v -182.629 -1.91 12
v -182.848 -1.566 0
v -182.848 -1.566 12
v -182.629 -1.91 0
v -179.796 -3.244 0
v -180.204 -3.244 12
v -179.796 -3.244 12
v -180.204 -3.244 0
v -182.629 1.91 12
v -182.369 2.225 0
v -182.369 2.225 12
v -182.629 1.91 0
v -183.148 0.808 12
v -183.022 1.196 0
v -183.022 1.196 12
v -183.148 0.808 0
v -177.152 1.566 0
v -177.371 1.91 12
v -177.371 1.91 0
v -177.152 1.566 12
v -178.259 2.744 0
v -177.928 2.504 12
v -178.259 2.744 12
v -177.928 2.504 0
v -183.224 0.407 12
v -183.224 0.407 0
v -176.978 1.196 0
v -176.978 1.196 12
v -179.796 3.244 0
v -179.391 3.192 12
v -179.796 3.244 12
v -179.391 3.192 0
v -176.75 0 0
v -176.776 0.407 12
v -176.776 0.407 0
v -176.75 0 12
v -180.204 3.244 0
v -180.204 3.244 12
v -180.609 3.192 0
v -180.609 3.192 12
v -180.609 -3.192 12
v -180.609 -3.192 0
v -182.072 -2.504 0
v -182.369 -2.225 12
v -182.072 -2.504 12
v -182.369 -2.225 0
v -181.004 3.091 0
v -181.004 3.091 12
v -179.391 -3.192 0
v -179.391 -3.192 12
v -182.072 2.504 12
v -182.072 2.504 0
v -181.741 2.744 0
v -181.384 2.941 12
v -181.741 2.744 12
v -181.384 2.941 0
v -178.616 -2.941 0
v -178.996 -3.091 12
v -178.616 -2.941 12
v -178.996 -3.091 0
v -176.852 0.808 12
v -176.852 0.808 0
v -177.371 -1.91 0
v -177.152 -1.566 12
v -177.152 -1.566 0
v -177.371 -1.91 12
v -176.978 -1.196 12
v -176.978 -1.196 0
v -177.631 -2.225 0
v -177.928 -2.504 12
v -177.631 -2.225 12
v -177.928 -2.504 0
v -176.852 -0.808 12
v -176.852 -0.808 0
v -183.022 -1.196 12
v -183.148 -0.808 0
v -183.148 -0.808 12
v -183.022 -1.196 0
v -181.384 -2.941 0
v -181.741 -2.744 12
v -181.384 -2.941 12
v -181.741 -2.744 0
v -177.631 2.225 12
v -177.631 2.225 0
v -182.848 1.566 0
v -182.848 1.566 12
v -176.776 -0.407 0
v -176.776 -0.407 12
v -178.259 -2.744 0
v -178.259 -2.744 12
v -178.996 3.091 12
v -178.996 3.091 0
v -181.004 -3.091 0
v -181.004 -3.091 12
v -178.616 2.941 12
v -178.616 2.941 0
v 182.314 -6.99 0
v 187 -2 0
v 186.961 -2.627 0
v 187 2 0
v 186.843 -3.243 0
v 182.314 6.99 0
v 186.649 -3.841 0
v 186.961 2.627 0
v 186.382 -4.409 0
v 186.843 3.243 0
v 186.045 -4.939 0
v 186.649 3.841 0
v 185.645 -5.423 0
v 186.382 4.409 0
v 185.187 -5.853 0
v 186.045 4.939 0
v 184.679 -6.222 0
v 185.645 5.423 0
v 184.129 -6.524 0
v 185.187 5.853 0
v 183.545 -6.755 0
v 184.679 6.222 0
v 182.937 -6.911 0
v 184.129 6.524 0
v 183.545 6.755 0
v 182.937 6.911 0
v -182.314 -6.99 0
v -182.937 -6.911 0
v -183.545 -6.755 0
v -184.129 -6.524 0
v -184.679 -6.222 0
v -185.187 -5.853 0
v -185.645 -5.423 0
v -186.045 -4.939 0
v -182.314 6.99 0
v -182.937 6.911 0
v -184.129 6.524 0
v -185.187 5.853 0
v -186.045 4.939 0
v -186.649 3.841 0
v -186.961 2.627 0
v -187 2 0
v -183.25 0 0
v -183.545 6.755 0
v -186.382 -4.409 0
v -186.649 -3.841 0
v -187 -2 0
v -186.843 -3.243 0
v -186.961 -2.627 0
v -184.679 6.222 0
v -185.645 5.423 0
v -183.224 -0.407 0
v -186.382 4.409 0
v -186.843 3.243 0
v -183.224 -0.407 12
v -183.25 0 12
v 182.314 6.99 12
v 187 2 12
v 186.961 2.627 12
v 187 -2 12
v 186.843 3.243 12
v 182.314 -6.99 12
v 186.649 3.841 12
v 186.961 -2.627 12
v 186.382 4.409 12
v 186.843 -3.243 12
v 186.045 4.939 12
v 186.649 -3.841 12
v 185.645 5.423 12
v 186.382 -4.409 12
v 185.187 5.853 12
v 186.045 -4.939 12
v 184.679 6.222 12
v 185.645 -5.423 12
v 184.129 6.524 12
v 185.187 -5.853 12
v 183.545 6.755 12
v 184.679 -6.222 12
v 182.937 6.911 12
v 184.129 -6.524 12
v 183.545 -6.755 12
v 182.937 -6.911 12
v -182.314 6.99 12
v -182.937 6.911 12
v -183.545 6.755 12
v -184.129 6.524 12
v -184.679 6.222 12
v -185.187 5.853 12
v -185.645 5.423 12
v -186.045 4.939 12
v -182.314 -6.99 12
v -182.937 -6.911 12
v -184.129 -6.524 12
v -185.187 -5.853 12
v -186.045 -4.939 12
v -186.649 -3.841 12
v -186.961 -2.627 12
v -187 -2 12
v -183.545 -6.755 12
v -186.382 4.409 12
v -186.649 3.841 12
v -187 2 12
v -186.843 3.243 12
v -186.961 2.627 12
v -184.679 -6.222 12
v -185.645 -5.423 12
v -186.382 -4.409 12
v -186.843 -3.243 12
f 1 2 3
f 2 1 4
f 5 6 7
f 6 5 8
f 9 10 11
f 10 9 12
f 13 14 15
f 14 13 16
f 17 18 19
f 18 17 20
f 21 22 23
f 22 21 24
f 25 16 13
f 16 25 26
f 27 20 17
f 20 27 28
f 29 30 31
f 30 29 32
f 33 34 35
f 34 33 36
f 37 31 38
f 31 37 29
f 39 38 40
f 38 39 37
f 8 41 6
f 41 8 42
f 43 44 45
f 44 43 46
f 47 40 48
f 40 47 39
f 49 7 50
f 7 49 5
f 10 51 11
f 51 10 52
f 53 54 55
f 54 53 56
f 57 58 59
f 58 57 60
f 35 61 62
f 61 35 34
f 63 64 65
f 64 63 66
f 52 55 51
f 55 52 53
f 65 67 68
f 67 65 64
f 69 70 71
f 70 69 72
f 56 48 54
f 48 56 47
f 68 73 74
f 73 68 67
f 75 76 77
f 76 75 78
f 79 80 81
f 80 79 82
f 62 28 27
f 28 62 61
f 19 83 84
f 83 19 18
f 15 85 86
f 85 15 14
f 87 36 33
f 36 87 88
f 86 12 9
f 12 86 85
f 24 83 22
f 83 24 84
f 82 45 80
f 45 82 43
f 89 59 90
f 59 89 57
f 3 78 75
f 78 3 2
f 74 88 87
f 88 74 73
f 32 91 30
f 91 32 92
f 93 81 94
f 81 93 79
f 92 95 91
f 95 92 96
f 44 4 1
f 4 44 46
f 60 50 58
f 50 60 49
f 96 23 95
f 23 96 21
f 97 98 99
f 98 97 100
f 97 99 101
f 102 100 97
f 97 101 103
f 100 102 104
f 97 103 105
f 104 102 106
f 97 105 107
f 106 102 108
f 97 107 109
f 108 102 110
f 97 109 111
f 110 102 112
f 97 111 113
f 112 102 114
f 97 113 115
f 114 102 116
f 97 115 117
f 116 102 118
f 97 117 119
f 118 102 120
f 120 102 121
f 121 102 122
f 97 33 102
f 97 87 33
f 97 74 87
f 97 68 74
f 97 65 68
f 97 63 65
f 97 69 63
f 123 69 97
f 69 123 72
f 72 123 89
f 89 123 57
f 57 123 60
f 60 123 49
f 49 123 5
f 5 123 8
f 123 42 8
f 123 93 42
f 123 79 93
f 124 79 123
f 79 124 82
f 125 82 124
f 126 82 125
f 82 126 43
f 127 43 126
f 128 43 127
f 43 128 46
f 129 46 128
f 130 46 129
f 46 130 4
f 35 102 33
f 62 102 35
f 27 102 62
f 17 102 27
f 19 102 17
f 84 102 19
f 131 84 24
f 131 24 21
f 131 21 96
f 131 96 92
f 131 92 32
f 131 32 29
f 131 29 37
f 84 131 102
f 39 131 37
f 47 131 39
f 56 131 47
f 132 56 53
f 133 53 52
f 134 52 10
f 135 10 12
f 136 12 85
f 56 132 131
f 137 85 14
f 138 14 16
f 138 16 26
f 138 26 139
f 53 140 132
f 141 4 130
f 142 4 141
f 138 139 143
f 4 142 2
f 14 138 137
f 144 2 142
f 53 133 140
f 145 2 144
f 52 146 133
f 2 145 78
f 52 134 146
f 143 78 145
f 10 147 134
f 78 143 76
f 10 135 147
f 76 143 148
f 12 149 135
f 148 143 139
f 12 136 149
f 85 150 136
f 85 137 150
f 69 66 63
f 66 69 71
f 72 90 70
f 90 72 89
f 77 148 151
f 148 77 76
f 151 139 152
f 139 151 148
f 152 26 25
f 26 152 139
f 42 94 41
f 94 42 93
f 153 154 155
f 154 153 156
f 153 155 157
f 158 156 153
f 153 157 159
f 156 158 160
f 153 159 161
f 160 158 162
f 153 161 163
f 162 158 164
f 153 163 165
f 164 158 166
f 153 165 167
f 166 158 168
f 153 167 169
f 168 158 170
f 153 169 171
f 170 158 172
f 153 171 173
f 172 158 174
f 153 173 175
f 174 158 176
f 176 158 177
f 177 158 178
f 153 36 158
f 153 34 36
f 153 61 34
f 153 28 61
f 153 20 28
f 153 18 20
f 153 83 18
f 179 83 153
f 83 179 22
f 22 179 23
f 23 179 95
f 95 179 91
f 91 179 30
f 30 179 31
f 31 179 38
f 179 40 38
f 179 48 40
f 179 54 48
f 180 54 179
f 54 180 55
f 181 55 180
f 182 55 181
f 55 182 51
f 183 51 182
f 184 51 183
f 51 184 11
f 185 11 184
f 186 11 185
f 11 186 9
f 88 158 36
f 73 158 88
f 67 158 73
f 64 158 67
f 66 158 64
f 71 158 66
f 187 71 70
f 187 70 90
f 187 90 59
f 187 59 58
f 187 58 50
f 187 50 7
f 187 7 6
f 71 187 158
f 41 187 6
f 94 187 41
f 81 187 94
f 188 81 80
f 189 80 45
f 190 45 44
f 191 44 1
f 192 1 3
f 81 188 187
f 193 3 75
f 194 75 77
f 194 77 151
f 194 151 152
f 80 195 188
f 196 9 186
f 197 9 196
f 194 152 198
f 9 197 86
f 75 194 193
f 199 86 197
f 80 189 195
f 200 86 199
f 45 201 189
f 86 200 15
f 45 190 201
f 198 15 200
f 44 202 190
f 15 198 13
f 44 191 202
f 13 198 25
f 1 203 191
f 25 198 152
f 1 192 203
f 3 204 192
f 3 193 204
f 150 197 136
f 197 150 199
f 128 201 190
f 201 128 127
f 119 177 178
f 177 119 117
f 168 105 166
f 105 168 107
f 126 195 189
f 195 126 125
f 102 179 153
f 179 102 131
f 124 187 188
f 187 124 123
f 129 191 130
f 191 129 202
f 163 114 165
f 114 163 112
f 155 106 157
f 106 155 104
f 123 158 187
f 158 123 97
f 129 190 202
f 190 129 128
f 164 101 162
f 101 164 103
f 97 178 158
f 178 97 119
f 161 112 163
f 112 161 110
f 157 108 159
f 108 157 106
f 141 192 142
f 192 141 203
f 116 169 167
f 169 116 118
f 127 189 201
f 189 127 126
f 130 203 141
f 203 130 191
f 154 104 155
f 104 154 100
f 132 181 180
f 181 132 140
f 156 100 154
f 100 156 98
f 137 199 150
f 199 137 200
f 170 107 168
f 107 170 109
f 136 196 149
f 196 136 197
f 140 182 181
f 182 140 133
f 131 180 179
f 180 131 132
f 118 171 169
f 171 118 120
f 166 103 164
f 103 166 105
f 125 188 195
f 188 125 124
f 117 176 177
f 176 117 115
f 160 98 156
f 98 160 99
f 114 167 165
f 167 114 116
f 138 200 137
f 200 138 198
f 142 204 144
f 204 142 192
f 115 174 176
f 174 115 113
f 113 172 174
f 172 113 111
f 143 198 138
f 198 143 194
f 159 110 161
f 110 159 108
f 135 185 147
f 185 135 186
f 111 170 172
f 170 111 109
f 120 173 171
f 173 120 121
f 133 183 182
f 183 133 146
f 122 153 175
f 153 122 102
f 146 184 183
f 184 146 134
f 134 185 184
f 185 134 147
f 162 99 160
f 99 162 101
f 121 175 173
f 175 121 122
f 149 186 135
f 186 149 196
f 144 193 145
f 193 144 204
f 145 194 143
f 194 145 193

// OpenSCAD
$fn = 50;


difference() {
	union() {
		hull() {
			translate(v = [-182.0000000000, 2.0000000000, 0]) {
				cylinder(h = 12, r = 5);
			}
			translate(v = [182.0000000000, 2.0000000000, 0]) {
				cylinder(h = 12, r = 5);
			}
			translate(v = [-182.0000000000, -2.0000000000, 0]) {
				cylinder(h = 12, r = 5);
			}
			translate(v = [182.0000000000, -2.0000000000, 0]) {
				cylinder(h = 12, r = 5);
			}
		}
	}
	union() {
		translate(v = [-180.0000000000, 0.0000000000, 0]) {
			cylinder(h = 12, r = 3.2500000000);
		}
		translate(v = [-180.0000000000, 0.0000000000, 0]) {
			cylinder(h = 12, r = 1.8000000000);
		}
		translate(v = [-180.0000000000, 0.0000000000, 0]) {
			cylinder(h = 12, r = 1.8000000000);
		}
		translate(v = [-180.0000000000, 0.0000000000, 0]) {
			cylinder(h = 12, r = 1.8000000000);
		}
	}
}
